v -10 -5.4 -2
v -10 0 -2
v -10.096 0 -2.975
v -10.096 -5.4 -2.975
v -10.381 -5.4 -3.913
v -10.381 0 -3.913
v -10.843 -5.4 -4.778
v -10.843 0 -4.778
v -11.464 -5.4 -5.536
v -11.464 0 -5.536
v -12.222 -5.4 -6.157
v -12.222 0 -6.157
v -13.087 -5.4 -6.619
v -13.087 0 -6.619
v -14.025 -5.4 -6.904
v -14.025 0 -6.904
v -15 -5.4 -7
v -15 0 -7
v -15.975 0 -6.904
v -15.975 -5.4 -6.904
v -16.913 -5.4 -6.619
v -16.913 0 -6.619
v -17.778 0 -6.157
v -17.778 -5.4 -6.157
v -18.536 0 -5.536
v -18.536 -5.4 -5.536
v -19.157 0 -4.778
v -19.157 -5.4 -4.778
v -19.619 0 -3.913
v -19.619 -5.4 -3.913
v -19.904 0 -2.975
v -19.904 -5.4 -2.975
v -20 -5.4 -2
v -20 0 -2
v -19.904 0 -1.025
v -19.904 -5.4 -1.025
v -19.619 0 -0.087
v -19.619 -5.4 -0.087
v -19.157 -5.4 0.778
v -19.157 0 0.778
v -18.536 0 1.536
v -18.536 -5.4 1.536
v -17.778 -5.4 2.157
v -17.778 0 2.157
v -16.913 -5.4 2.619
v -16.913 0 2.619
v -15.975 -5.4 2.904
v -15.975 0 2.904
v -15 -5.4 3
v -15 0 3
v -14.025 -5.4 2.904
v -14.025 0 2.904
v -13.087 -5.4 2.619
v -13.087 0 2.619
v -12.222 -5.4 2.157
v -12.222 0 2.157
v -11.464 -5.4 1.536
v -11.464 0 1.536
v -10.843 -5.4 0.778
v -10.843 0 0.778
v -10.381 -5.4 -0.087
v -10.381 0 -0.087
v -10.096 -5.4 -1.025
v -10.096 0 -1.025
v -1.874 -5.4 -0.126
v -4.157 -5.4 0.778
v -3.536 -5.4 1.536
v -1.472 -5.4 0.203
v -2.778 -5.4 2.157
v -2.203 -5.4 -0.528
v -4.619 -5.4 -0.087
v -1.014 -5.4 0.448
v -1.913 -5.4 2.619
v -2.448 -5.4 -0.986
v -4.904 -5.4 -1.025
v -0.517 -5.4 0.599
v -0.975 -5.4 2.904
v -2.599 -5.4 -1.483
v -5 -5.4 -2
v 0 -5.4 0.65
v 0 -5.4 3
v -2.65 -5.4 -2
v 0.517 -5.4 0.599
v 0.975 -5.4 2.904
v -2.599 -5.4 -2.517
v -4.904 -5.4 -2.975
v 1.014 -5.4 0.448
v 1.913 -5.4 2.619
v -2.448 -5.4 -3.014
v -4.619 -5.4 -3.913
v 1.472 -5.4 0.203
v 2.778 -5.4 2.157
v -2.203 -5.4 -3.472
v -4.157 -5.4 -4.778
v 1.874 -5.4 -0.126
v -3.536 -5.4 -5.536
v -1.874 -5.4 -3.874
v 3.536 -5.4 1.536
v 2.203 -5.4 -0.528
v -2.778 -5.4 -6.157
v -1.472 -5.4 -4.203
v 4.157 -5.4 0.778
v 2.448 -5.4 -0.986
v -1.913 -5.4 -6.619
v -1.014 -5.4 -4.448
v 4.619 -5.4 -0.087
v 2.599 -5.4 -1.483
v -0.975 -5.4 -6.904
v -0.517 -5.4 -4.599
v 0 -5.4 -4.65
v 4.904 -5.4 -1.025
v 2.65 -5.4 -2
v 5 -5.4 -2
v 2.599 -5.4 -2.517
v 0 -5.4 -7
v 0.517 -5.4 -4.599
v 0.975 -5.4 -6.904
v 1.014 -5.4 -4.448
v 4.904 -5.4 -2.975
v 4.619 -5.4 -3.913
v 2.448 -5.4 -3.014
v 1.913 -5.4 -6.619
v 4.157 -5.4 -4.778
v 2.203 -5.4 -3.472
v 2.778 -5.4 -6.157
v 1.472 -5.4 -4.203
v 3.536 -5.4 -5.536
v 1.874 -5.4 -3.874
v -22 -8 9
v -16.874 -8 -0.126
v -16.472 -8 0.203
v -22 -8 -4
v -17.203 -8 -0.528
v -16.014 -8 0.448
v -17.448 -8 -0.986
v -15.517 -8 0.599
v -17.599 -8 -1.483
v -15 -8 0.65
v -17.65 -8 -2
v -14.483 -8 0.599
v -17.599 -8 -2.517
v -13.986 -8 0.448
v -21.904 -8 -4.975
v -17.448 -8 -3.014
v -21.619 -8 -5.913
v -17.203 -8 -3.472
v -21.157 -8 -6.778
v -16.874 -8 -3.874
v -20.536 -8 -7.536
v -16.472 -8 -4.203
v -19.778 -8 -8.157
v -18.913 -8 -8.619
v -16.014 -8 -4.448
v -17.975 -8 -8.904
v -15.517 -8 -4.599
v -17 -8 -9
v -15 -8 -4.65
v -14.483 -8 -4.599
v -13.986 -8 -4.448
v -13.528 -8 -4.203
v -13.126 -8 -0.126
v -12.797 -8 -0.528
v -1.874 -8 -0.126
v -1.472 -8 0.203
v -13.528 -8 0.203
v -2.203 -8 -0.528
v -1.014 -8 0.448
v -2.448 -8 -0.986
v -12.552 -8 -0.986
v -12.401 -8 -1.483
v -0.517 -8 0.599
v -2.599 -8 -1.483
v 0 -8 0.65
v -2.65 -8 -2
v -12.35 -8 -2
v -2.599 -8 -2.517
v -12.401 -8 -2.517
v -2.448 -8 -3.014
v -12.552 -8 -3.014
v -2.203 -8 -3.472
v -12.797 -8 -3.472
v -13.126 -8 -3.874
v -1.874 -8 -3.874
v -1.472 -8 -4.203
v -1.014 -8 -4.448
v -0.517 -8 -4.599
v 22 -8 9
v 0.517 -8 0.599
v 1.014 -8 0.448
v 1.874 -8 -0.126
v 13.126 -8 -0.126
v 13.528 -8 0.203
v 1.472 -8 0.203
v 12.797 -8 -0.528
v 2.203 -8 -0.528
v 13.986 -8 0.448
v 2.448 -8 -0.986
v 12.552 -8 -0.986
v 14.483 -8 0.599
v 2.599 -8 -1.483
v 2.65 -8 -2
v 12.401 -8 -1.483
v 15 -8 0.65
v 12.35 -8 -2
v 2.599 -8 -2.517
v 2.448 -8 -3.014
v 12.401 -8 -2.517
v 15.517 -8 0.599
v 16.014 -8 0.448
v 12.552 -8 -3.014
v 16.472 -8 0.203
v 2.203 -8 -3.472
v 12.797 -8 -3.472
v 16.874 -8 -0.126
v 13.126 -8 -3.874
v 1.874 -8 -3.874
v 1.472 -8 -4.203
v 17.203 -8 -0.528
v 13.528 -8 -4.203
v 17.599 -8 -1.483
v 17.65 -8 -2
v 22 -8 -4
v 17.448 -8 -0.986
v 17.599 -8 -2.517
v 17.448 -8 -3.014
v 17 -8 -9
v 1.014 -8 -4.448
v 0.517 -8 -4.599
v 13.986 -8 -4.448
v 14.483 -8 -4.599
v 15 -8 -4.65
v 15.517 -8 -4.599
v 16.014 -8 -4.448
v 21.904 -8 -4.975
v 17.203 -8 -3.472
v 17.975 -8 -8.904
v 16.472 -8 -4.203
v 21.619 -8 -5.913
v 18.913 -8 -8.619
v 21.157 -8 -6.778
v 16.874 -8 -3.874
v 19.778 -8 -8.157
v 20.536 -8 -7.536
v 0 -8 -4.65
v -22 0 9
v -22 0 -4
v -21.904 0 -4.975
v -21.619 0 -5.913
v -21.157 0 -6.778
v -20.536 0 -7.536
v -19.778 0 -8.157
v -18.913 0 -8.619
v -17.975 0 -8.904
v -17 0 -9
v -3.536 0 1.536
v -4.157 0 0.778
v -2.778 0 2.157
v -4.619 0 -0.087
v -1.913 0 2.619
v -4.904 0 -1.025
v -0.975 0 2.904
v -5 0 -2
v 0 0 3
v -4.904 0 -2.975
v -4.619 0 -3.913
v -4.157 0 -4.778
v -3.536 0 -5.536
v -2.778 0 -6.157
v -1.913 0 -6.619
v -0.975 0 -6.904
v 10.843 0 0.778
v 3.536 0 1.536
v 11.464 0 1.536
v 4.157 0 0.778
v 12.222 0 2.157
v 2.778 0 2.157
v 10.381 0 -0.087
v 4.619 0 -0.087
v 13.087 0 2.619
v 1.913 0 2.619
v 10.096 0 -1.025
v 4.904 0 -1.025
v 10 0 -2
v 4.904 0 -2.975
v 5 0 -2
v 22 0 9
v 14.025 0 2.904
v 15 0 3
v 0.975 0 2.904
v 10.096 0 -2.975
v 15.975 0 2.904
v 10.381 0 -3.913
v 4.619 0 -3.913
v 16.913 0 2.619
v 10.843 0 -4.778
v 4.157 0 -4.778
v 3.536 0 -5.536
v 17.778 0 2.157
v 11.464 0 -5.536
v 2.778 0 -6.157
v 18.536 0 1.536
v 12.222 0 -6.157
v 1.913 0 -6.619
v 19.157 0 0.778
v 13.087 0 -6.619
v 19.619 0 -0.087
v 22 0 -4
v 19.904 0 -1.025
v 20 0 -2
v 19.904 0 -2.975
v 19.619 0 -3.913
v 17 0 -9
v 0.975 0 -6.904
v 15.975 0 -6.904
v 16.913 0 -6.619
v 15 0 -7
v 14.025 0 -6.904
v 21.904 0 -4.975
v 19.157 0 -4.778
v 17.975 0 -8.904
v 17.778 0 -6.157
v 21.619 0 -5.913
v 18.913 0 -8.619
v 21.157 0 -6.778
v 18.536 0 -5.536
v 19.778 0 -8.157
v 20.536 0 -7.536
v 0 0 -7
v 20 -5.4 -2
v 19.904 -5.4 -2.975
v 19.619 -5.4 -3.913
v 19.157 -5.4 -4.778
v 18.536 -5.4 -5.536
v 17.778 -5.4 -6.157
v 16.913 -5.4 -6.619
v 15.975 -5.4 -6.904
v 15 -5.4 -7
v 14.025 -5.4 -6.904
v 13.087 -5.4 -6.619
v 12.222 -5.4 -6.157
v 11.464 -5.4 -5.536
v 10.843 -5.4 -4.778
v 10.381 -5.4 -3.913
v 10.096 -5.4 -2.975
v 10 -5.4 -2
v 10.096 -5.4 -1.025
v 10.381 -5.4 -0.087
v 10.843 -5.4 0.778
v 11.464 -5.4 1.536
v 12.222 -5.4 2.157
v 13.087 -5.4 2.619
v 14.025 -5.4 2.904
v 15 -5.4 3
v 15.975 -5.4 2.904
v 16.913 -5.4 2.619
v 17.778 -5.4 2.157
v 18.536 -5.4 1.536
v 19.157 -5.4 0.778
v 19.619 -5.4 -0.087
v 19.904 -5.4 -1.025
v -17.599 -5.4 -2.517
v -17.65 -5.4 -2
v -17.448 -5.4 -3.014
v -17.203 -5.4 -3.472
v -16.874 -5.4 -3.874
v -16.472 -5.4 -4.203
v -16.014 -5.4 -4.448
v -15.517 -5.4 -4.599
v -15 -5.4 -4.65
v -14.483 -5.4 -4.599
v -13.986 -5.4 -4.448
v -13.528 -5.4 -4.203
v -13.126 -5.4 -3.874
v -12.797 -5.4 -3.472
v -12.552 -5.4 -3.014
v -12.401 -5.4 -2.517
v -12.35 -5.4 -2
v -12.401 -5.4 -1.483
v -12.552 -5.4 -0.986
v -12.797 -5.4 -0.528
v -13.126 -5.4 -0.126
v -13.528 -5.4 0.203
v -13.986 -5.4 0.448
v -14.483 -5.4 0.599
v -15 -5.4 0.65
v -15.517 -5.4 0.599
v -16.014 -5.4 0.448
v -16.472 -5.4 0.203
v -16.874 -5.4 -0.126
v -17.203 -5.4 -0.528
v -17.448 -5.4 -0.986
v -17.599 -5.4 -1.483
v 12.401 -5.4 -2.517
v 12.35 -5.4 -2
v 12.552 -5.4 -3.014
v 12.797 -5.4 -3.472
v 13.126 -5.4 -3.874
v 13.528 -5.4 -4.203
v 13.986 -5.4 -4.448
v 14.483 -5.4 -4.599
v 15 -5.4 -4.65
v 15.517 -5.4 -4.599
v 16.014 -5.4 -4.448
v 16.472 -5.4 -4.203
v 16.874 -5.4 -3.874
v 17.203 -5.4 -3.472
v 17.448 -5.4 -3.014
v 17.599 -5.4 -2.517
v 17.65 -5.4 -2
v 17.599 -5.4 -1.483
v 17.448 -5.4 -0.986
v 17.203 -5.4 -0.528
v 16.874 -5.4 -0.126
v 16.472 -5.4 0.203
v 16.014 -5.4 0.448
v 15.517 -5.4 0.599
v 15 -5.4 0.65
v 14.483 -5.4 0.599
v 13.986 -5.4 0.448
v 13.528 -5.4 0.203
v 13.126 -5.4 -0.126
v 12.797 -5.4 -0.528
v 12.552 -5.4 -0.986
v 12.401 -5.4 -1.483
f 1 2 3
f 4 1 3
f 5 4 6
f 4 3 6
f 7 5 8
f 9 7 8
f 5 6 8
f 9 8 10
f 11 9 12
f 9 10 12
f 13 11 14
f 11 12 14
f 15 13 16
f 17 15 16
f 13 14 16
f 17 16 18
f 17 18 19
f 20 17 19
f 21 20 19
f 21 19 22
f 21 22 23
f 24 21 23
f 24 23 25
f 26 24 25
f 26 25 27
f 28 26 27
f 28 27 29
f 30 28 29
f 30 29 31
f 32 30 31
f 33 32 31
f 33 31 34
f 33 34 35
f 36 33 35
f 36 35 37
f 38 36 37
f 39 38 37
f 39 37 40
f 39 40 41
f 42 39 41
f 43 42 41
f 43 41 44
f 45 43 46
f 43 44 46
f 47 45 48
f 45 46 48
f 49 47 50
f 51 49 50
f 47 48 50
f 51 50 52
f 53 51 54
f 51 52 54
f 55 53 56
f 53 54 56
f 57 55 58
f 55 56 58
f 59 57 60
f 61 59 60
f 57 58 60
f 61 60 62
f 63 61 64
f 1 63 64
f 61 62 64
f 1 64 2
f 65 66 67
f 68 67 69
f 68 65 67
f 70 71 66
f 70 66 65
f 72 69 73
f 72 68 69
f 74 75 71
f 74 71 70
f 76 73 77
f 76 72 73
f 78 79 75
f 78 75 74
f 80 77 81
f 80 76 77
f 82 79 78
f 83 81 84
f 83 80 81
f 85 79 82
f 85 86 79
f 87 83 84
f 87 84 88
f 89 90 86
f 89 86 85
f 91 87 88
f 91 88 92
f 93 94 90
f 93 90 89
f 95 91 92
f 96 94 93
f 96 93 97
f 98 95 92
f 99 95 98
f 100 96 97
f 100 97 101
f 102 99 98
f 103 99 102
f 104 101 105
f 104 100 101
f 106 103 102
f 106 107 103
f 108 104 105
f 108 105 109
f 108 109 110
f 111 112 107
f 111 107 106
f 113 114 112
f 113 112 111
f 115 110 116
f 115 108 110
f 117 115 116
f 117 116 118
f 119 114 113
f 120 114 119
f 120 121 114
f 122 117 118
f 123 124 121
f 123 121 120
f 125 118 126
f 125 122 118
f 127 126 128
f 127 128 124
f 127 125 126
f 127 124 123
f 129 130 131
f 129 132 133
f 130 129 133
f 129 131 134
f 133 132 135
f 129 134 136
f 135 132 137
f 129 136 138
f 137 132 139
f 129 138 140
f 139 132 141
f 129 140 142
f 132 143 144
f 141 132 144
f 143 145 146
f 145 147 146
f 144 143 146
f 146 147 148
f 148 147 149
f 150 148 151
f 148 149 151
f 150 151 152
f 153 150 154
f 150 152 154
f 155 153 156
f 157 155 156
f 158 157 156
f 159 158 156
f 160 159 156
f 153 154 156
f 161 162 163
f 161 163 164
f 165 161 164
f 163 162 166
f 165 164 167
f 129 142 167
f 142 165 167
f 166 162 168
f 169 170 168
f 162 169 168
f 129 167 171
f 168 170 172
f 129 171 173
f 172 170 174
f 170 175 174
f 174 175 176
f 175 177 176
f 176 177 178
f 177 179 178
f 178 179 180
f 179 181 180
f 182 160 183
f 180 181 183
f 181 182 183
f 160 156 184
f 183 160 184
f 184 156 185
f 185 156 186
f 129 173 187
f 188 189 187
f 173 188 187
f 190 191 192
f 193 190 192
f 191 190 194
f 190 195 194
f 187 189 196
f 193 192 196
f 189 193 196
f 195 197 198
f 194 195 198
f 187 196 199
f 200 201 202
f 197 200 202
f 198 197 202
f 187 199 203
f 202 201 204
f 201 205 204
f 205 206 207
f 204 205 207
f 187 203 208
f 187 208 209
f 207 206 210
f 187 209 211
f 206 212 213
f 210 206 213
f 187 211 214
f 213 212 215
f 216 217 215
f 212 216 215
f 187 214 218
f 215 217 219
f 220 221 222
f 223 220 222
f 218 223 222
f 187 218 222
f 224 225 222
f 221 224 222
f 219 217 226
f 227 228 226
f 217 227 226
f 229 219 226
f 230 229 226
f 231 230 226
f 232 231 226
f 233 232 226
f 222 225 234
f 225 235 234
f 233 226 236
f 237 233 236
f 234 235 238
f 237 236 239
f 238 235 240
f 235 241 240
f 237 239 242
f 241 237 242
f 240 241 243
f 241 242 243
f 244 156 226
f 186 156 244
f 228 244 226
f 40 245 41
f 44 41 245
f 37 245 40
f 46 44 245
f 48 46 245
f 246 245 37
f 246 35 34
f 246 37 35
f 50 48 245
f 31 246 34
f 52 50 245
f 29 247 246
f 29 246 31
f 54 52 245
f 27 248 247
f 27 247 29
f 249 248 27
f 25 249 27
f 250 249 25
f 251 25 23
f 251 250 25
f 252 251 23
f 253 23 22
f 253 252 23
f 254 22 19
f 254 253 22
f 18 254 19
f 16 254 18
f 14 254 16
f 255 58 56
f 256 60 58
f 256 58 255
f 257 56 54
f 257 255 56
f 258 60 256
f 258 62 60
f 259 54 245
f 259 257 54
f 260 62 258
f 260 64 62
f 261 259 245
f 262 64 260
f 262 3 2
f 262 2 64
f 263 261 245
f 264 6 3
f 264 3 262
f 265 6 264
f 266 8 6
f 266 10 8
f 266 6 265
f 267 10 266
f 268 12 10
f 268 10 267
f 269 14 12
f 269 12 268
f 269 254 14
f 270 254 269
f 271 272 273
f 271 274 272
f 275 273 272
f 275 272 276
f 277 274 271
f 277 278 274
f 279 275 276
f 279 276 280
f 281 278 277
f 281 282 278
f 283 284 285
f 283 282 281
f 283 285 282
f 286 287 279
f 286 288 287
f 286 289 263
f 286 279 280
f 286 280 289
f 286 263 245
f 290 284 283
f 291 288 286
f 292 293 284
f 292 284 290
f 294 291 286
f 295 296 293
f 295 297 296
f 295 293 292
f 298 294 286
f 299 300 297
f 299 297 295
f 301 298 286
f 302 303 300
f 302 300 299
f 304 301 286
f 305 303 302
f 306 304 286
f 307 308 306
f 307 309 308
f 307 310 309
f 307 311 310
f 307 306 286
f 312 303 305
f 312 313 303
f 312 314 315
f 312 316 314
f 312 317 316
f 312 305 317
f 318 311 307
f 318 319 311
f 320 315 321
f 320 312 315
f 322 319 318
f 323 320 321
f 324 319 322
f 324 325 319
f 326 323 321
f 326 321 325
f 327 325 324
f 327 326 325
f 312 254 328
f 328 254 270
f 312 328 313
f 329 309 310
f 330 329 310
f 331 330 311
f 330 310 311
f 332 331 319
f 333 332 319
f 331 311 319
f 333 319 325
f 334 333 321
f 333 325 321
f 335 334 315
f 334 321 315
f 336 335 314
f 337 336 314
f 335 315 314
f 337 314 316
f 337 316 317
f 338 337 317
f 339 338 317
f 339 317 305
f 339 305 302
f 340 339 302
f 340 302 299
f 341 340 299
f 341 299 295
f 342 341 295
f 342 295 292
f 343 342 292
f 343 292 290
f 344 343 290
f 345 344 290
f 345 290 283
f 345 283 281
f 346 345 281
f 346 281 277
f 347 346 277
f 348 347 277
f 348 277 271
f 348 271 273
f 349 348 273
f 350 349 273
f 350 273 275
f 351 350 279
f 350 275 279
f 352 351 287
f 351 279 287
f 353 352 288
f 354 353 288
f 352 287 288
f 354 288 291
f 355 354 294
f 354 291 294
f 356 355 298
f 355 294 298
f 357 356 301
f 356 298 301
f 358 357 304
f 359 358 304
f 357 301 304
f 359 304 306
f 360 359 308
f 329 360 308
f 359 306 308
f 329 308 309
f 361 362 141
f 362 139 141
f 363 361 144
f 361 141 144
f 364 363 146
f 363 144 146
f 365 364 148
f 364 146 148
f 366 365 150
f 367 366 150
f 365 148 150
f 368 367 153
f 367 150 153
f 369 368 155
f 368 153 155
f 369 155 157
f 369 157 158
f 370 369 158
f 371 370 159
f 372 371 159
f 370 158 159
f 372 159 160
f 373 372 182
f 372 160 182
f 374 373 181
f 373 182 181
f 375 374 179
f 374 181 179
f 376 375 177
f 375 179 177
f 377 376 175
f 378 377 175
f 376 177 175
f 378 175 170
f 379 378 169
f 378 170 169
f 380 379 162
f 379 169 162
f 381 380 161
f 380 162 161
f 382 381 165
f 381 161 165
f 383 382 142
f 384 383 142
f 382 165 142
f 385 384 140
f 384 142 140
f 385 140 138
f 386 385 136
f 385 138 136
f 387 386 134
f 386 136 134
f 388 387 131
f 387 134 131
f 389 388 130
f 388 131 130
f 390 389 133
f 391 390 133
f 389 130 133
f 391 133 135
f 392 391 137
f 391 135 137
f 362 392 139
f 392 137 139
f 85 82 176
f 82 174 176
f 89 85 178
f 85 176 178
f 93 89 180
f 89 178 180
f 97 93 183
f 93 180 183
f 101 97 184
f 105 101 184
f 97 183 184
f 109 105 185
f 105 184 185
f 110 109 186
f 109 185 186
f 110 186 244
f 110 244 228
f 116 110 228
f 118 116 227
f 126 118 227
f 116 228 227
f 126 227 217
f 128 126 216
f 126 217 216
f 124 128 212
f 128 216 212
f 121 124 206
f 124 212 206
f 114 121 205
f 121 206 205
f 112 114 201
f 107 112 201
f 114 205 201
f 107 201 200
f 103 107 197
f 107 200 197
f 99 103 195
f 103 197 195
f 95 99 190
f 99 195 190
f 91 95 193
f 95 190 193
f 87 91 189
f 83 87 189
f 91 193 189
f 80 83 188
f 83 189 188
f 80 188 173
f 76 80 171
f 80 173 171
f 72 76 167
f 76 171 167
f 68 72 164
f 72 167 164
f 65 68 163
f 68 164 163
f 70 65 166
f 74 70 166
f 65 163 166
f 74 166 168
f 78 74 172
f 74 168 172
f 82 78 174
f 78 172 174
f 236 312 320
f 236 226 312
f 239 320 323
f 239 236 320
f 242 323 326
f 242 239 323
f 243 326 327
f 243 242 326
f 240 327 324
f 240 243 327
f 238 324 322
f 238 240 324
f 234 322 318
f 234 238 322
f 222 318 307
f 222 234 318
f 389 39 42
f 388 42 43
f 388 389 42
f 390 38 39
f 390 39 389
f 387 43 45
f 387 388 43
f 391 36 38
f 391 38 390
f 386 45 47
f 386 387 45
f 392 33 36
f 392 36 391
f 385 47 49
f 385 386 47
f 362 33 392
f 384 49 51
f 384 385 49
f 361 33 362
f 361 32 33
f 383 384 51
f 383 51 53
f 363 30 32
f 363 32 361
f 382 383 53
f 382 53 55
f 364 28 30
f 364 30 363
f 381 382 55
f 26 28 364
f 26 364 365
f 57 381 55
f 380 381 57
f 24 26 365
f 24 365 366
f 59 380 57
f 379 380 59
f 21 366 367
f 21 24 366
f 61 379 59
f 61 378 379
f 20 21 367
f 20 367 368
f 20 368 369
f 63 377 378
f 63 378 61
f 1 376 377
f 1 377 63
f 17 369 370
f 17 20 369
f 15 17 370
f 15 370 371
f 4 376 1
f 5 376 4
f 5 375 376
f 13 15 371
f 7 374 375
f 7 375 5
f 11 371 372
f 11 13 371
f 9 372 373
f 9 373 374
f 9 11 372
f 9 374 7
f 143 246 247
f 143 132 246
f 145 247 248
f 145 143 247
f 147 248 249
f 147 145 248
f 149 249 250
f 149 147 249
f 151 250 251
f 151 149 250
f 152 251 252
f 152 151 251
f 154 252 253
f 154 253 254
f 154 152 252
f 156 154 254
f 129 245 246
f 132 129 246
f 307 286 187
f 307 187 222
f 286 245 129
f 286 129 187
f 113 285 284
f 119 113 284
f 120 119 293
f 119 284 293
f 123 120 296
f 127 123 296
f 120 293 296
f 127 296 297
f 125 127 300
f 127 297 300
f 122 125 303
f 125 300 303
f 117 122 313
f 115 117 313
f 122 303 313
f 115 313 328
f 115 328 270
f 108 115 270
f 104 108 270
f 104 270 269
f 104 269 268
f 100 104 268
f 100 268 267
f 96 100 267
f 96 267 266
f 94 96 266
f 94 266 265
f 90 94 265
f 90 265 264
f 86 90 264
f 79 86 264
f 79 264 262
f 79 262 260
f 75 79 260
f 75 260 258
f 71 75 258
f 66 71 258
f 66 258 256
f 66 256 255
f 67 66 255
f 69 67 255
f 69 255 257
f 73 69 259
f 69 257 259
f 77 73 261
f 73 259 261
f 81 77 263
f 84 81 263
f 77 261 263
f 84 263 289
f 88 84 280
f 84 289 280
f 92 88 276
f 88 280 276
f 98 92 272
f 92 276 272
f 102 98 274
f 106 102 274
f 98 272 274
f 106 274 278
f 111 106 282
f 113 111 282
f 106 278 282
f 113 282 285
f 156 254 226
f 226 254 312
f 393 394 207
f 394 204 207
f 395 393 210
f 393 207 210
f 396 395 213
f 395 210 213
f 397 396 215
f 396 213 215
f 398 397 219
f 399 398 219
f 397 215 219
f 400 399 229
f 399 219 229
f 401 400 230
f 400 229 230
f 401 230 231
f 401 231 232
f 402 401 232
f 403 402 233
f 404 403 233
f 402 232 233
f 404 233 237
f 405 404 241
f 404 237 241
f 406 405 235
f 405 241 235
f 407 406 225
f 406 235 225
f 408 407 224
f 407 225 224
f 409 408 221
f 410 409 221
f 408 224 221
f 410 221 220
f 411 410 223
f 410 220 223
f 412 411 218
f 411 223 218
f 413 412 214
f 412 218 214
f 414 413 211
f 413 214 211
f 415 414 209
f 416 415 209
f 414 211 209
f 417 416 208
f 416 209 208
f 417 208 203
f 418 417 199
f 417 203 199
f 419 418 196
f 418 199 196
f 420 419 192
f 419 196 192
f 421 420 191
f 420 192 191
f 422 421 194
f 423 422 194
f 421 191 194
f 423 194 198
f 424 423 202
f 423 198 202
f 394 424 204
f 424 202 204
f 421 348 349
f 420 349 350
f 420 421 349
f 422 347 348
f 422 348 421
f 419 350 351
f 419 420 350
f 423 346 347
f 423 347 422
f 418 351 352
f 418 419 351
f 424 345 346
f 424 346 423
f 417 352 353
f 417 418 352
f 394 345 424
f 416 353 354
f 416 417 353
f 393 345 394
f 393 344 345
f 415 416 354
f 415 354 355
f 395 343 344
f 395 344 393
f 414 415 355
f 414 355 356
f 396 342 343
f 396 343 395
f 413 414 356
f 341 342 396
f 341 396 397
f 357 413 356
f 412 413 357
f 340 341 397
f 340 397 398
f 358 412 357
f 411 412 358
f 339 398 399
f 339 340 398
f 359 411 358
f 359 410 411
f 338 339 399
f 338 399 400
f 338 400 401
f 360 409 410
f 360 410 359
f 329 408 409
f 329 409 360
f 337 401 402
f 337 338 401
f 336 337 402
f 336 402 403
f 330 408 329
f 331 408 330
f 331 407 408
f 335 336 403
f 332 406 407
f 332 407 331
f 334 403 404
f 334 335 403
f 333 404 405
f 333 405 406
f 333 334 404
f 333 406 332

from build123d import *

# Parameters (mm, degrees)
SKETCH1_W                                           = 44
SKETCH1_H                                           = 18
BOSS_EXTRUDE1_DEPTH                                 = 8
CBORE_FOR_M5_HEX_SOCKET_HEAD_CAP_SCREW1_D           = 5.3
CBORE_FOR_M5_HEX_SOCKET_HEAD_CAP_SCREW1_CBORE_D     = 10
CBORE_FOR_M5_HEX_SOCKET_HEAD_CAP_SCREW1_CBORE_DEPTH = 5.4
FILLET1_R                                           = 5


with BuildPart() as part:
    # Sketch1 → Boss-Extrude1 (new body)
    with BuildSketch(Plane(origin=(0, 0, 0), x_dir=(1, 0, 0), z_dir=(0, 1, 0))):
        Rectangle(SKETCH1_W, SKETCH1_H)
    extrude(amount=-BOSS_EXTRUDE1_DEPTH)

    # CBORE for M5 Hex Socket Head Cap Screw1 (through all)
    with Locations(Plane(origin=(0, 0, 0), x_dir=(1, 0, 0), z_dir=(0, 1, 0))):
        with Locations((-15, 2), (0, 2), (15, 2)):
            CounterBoreHole(CBORE_FOR_M5_HEX_SOCKET_HEAD_CAP_SCREW1_D / 2, CBORE_FOR_M5_HEX_SOCKET_HEAD_CAP_SCREW1_CBORE_D / 2, CBORE_FOR_M5_HEX_SOCKET_HEAD_CAP_SCREW1_CBORE_DEPTH)

    # Fillet1
    fillet1_edges = [part.edges().sort_by_distance(p)[0] for p in [
        (-22, -4, -9),
        (22, -4, -9),
    ]]
    fillet(fillet1_edges, radius=FILLET1_R)


solid = part.part
